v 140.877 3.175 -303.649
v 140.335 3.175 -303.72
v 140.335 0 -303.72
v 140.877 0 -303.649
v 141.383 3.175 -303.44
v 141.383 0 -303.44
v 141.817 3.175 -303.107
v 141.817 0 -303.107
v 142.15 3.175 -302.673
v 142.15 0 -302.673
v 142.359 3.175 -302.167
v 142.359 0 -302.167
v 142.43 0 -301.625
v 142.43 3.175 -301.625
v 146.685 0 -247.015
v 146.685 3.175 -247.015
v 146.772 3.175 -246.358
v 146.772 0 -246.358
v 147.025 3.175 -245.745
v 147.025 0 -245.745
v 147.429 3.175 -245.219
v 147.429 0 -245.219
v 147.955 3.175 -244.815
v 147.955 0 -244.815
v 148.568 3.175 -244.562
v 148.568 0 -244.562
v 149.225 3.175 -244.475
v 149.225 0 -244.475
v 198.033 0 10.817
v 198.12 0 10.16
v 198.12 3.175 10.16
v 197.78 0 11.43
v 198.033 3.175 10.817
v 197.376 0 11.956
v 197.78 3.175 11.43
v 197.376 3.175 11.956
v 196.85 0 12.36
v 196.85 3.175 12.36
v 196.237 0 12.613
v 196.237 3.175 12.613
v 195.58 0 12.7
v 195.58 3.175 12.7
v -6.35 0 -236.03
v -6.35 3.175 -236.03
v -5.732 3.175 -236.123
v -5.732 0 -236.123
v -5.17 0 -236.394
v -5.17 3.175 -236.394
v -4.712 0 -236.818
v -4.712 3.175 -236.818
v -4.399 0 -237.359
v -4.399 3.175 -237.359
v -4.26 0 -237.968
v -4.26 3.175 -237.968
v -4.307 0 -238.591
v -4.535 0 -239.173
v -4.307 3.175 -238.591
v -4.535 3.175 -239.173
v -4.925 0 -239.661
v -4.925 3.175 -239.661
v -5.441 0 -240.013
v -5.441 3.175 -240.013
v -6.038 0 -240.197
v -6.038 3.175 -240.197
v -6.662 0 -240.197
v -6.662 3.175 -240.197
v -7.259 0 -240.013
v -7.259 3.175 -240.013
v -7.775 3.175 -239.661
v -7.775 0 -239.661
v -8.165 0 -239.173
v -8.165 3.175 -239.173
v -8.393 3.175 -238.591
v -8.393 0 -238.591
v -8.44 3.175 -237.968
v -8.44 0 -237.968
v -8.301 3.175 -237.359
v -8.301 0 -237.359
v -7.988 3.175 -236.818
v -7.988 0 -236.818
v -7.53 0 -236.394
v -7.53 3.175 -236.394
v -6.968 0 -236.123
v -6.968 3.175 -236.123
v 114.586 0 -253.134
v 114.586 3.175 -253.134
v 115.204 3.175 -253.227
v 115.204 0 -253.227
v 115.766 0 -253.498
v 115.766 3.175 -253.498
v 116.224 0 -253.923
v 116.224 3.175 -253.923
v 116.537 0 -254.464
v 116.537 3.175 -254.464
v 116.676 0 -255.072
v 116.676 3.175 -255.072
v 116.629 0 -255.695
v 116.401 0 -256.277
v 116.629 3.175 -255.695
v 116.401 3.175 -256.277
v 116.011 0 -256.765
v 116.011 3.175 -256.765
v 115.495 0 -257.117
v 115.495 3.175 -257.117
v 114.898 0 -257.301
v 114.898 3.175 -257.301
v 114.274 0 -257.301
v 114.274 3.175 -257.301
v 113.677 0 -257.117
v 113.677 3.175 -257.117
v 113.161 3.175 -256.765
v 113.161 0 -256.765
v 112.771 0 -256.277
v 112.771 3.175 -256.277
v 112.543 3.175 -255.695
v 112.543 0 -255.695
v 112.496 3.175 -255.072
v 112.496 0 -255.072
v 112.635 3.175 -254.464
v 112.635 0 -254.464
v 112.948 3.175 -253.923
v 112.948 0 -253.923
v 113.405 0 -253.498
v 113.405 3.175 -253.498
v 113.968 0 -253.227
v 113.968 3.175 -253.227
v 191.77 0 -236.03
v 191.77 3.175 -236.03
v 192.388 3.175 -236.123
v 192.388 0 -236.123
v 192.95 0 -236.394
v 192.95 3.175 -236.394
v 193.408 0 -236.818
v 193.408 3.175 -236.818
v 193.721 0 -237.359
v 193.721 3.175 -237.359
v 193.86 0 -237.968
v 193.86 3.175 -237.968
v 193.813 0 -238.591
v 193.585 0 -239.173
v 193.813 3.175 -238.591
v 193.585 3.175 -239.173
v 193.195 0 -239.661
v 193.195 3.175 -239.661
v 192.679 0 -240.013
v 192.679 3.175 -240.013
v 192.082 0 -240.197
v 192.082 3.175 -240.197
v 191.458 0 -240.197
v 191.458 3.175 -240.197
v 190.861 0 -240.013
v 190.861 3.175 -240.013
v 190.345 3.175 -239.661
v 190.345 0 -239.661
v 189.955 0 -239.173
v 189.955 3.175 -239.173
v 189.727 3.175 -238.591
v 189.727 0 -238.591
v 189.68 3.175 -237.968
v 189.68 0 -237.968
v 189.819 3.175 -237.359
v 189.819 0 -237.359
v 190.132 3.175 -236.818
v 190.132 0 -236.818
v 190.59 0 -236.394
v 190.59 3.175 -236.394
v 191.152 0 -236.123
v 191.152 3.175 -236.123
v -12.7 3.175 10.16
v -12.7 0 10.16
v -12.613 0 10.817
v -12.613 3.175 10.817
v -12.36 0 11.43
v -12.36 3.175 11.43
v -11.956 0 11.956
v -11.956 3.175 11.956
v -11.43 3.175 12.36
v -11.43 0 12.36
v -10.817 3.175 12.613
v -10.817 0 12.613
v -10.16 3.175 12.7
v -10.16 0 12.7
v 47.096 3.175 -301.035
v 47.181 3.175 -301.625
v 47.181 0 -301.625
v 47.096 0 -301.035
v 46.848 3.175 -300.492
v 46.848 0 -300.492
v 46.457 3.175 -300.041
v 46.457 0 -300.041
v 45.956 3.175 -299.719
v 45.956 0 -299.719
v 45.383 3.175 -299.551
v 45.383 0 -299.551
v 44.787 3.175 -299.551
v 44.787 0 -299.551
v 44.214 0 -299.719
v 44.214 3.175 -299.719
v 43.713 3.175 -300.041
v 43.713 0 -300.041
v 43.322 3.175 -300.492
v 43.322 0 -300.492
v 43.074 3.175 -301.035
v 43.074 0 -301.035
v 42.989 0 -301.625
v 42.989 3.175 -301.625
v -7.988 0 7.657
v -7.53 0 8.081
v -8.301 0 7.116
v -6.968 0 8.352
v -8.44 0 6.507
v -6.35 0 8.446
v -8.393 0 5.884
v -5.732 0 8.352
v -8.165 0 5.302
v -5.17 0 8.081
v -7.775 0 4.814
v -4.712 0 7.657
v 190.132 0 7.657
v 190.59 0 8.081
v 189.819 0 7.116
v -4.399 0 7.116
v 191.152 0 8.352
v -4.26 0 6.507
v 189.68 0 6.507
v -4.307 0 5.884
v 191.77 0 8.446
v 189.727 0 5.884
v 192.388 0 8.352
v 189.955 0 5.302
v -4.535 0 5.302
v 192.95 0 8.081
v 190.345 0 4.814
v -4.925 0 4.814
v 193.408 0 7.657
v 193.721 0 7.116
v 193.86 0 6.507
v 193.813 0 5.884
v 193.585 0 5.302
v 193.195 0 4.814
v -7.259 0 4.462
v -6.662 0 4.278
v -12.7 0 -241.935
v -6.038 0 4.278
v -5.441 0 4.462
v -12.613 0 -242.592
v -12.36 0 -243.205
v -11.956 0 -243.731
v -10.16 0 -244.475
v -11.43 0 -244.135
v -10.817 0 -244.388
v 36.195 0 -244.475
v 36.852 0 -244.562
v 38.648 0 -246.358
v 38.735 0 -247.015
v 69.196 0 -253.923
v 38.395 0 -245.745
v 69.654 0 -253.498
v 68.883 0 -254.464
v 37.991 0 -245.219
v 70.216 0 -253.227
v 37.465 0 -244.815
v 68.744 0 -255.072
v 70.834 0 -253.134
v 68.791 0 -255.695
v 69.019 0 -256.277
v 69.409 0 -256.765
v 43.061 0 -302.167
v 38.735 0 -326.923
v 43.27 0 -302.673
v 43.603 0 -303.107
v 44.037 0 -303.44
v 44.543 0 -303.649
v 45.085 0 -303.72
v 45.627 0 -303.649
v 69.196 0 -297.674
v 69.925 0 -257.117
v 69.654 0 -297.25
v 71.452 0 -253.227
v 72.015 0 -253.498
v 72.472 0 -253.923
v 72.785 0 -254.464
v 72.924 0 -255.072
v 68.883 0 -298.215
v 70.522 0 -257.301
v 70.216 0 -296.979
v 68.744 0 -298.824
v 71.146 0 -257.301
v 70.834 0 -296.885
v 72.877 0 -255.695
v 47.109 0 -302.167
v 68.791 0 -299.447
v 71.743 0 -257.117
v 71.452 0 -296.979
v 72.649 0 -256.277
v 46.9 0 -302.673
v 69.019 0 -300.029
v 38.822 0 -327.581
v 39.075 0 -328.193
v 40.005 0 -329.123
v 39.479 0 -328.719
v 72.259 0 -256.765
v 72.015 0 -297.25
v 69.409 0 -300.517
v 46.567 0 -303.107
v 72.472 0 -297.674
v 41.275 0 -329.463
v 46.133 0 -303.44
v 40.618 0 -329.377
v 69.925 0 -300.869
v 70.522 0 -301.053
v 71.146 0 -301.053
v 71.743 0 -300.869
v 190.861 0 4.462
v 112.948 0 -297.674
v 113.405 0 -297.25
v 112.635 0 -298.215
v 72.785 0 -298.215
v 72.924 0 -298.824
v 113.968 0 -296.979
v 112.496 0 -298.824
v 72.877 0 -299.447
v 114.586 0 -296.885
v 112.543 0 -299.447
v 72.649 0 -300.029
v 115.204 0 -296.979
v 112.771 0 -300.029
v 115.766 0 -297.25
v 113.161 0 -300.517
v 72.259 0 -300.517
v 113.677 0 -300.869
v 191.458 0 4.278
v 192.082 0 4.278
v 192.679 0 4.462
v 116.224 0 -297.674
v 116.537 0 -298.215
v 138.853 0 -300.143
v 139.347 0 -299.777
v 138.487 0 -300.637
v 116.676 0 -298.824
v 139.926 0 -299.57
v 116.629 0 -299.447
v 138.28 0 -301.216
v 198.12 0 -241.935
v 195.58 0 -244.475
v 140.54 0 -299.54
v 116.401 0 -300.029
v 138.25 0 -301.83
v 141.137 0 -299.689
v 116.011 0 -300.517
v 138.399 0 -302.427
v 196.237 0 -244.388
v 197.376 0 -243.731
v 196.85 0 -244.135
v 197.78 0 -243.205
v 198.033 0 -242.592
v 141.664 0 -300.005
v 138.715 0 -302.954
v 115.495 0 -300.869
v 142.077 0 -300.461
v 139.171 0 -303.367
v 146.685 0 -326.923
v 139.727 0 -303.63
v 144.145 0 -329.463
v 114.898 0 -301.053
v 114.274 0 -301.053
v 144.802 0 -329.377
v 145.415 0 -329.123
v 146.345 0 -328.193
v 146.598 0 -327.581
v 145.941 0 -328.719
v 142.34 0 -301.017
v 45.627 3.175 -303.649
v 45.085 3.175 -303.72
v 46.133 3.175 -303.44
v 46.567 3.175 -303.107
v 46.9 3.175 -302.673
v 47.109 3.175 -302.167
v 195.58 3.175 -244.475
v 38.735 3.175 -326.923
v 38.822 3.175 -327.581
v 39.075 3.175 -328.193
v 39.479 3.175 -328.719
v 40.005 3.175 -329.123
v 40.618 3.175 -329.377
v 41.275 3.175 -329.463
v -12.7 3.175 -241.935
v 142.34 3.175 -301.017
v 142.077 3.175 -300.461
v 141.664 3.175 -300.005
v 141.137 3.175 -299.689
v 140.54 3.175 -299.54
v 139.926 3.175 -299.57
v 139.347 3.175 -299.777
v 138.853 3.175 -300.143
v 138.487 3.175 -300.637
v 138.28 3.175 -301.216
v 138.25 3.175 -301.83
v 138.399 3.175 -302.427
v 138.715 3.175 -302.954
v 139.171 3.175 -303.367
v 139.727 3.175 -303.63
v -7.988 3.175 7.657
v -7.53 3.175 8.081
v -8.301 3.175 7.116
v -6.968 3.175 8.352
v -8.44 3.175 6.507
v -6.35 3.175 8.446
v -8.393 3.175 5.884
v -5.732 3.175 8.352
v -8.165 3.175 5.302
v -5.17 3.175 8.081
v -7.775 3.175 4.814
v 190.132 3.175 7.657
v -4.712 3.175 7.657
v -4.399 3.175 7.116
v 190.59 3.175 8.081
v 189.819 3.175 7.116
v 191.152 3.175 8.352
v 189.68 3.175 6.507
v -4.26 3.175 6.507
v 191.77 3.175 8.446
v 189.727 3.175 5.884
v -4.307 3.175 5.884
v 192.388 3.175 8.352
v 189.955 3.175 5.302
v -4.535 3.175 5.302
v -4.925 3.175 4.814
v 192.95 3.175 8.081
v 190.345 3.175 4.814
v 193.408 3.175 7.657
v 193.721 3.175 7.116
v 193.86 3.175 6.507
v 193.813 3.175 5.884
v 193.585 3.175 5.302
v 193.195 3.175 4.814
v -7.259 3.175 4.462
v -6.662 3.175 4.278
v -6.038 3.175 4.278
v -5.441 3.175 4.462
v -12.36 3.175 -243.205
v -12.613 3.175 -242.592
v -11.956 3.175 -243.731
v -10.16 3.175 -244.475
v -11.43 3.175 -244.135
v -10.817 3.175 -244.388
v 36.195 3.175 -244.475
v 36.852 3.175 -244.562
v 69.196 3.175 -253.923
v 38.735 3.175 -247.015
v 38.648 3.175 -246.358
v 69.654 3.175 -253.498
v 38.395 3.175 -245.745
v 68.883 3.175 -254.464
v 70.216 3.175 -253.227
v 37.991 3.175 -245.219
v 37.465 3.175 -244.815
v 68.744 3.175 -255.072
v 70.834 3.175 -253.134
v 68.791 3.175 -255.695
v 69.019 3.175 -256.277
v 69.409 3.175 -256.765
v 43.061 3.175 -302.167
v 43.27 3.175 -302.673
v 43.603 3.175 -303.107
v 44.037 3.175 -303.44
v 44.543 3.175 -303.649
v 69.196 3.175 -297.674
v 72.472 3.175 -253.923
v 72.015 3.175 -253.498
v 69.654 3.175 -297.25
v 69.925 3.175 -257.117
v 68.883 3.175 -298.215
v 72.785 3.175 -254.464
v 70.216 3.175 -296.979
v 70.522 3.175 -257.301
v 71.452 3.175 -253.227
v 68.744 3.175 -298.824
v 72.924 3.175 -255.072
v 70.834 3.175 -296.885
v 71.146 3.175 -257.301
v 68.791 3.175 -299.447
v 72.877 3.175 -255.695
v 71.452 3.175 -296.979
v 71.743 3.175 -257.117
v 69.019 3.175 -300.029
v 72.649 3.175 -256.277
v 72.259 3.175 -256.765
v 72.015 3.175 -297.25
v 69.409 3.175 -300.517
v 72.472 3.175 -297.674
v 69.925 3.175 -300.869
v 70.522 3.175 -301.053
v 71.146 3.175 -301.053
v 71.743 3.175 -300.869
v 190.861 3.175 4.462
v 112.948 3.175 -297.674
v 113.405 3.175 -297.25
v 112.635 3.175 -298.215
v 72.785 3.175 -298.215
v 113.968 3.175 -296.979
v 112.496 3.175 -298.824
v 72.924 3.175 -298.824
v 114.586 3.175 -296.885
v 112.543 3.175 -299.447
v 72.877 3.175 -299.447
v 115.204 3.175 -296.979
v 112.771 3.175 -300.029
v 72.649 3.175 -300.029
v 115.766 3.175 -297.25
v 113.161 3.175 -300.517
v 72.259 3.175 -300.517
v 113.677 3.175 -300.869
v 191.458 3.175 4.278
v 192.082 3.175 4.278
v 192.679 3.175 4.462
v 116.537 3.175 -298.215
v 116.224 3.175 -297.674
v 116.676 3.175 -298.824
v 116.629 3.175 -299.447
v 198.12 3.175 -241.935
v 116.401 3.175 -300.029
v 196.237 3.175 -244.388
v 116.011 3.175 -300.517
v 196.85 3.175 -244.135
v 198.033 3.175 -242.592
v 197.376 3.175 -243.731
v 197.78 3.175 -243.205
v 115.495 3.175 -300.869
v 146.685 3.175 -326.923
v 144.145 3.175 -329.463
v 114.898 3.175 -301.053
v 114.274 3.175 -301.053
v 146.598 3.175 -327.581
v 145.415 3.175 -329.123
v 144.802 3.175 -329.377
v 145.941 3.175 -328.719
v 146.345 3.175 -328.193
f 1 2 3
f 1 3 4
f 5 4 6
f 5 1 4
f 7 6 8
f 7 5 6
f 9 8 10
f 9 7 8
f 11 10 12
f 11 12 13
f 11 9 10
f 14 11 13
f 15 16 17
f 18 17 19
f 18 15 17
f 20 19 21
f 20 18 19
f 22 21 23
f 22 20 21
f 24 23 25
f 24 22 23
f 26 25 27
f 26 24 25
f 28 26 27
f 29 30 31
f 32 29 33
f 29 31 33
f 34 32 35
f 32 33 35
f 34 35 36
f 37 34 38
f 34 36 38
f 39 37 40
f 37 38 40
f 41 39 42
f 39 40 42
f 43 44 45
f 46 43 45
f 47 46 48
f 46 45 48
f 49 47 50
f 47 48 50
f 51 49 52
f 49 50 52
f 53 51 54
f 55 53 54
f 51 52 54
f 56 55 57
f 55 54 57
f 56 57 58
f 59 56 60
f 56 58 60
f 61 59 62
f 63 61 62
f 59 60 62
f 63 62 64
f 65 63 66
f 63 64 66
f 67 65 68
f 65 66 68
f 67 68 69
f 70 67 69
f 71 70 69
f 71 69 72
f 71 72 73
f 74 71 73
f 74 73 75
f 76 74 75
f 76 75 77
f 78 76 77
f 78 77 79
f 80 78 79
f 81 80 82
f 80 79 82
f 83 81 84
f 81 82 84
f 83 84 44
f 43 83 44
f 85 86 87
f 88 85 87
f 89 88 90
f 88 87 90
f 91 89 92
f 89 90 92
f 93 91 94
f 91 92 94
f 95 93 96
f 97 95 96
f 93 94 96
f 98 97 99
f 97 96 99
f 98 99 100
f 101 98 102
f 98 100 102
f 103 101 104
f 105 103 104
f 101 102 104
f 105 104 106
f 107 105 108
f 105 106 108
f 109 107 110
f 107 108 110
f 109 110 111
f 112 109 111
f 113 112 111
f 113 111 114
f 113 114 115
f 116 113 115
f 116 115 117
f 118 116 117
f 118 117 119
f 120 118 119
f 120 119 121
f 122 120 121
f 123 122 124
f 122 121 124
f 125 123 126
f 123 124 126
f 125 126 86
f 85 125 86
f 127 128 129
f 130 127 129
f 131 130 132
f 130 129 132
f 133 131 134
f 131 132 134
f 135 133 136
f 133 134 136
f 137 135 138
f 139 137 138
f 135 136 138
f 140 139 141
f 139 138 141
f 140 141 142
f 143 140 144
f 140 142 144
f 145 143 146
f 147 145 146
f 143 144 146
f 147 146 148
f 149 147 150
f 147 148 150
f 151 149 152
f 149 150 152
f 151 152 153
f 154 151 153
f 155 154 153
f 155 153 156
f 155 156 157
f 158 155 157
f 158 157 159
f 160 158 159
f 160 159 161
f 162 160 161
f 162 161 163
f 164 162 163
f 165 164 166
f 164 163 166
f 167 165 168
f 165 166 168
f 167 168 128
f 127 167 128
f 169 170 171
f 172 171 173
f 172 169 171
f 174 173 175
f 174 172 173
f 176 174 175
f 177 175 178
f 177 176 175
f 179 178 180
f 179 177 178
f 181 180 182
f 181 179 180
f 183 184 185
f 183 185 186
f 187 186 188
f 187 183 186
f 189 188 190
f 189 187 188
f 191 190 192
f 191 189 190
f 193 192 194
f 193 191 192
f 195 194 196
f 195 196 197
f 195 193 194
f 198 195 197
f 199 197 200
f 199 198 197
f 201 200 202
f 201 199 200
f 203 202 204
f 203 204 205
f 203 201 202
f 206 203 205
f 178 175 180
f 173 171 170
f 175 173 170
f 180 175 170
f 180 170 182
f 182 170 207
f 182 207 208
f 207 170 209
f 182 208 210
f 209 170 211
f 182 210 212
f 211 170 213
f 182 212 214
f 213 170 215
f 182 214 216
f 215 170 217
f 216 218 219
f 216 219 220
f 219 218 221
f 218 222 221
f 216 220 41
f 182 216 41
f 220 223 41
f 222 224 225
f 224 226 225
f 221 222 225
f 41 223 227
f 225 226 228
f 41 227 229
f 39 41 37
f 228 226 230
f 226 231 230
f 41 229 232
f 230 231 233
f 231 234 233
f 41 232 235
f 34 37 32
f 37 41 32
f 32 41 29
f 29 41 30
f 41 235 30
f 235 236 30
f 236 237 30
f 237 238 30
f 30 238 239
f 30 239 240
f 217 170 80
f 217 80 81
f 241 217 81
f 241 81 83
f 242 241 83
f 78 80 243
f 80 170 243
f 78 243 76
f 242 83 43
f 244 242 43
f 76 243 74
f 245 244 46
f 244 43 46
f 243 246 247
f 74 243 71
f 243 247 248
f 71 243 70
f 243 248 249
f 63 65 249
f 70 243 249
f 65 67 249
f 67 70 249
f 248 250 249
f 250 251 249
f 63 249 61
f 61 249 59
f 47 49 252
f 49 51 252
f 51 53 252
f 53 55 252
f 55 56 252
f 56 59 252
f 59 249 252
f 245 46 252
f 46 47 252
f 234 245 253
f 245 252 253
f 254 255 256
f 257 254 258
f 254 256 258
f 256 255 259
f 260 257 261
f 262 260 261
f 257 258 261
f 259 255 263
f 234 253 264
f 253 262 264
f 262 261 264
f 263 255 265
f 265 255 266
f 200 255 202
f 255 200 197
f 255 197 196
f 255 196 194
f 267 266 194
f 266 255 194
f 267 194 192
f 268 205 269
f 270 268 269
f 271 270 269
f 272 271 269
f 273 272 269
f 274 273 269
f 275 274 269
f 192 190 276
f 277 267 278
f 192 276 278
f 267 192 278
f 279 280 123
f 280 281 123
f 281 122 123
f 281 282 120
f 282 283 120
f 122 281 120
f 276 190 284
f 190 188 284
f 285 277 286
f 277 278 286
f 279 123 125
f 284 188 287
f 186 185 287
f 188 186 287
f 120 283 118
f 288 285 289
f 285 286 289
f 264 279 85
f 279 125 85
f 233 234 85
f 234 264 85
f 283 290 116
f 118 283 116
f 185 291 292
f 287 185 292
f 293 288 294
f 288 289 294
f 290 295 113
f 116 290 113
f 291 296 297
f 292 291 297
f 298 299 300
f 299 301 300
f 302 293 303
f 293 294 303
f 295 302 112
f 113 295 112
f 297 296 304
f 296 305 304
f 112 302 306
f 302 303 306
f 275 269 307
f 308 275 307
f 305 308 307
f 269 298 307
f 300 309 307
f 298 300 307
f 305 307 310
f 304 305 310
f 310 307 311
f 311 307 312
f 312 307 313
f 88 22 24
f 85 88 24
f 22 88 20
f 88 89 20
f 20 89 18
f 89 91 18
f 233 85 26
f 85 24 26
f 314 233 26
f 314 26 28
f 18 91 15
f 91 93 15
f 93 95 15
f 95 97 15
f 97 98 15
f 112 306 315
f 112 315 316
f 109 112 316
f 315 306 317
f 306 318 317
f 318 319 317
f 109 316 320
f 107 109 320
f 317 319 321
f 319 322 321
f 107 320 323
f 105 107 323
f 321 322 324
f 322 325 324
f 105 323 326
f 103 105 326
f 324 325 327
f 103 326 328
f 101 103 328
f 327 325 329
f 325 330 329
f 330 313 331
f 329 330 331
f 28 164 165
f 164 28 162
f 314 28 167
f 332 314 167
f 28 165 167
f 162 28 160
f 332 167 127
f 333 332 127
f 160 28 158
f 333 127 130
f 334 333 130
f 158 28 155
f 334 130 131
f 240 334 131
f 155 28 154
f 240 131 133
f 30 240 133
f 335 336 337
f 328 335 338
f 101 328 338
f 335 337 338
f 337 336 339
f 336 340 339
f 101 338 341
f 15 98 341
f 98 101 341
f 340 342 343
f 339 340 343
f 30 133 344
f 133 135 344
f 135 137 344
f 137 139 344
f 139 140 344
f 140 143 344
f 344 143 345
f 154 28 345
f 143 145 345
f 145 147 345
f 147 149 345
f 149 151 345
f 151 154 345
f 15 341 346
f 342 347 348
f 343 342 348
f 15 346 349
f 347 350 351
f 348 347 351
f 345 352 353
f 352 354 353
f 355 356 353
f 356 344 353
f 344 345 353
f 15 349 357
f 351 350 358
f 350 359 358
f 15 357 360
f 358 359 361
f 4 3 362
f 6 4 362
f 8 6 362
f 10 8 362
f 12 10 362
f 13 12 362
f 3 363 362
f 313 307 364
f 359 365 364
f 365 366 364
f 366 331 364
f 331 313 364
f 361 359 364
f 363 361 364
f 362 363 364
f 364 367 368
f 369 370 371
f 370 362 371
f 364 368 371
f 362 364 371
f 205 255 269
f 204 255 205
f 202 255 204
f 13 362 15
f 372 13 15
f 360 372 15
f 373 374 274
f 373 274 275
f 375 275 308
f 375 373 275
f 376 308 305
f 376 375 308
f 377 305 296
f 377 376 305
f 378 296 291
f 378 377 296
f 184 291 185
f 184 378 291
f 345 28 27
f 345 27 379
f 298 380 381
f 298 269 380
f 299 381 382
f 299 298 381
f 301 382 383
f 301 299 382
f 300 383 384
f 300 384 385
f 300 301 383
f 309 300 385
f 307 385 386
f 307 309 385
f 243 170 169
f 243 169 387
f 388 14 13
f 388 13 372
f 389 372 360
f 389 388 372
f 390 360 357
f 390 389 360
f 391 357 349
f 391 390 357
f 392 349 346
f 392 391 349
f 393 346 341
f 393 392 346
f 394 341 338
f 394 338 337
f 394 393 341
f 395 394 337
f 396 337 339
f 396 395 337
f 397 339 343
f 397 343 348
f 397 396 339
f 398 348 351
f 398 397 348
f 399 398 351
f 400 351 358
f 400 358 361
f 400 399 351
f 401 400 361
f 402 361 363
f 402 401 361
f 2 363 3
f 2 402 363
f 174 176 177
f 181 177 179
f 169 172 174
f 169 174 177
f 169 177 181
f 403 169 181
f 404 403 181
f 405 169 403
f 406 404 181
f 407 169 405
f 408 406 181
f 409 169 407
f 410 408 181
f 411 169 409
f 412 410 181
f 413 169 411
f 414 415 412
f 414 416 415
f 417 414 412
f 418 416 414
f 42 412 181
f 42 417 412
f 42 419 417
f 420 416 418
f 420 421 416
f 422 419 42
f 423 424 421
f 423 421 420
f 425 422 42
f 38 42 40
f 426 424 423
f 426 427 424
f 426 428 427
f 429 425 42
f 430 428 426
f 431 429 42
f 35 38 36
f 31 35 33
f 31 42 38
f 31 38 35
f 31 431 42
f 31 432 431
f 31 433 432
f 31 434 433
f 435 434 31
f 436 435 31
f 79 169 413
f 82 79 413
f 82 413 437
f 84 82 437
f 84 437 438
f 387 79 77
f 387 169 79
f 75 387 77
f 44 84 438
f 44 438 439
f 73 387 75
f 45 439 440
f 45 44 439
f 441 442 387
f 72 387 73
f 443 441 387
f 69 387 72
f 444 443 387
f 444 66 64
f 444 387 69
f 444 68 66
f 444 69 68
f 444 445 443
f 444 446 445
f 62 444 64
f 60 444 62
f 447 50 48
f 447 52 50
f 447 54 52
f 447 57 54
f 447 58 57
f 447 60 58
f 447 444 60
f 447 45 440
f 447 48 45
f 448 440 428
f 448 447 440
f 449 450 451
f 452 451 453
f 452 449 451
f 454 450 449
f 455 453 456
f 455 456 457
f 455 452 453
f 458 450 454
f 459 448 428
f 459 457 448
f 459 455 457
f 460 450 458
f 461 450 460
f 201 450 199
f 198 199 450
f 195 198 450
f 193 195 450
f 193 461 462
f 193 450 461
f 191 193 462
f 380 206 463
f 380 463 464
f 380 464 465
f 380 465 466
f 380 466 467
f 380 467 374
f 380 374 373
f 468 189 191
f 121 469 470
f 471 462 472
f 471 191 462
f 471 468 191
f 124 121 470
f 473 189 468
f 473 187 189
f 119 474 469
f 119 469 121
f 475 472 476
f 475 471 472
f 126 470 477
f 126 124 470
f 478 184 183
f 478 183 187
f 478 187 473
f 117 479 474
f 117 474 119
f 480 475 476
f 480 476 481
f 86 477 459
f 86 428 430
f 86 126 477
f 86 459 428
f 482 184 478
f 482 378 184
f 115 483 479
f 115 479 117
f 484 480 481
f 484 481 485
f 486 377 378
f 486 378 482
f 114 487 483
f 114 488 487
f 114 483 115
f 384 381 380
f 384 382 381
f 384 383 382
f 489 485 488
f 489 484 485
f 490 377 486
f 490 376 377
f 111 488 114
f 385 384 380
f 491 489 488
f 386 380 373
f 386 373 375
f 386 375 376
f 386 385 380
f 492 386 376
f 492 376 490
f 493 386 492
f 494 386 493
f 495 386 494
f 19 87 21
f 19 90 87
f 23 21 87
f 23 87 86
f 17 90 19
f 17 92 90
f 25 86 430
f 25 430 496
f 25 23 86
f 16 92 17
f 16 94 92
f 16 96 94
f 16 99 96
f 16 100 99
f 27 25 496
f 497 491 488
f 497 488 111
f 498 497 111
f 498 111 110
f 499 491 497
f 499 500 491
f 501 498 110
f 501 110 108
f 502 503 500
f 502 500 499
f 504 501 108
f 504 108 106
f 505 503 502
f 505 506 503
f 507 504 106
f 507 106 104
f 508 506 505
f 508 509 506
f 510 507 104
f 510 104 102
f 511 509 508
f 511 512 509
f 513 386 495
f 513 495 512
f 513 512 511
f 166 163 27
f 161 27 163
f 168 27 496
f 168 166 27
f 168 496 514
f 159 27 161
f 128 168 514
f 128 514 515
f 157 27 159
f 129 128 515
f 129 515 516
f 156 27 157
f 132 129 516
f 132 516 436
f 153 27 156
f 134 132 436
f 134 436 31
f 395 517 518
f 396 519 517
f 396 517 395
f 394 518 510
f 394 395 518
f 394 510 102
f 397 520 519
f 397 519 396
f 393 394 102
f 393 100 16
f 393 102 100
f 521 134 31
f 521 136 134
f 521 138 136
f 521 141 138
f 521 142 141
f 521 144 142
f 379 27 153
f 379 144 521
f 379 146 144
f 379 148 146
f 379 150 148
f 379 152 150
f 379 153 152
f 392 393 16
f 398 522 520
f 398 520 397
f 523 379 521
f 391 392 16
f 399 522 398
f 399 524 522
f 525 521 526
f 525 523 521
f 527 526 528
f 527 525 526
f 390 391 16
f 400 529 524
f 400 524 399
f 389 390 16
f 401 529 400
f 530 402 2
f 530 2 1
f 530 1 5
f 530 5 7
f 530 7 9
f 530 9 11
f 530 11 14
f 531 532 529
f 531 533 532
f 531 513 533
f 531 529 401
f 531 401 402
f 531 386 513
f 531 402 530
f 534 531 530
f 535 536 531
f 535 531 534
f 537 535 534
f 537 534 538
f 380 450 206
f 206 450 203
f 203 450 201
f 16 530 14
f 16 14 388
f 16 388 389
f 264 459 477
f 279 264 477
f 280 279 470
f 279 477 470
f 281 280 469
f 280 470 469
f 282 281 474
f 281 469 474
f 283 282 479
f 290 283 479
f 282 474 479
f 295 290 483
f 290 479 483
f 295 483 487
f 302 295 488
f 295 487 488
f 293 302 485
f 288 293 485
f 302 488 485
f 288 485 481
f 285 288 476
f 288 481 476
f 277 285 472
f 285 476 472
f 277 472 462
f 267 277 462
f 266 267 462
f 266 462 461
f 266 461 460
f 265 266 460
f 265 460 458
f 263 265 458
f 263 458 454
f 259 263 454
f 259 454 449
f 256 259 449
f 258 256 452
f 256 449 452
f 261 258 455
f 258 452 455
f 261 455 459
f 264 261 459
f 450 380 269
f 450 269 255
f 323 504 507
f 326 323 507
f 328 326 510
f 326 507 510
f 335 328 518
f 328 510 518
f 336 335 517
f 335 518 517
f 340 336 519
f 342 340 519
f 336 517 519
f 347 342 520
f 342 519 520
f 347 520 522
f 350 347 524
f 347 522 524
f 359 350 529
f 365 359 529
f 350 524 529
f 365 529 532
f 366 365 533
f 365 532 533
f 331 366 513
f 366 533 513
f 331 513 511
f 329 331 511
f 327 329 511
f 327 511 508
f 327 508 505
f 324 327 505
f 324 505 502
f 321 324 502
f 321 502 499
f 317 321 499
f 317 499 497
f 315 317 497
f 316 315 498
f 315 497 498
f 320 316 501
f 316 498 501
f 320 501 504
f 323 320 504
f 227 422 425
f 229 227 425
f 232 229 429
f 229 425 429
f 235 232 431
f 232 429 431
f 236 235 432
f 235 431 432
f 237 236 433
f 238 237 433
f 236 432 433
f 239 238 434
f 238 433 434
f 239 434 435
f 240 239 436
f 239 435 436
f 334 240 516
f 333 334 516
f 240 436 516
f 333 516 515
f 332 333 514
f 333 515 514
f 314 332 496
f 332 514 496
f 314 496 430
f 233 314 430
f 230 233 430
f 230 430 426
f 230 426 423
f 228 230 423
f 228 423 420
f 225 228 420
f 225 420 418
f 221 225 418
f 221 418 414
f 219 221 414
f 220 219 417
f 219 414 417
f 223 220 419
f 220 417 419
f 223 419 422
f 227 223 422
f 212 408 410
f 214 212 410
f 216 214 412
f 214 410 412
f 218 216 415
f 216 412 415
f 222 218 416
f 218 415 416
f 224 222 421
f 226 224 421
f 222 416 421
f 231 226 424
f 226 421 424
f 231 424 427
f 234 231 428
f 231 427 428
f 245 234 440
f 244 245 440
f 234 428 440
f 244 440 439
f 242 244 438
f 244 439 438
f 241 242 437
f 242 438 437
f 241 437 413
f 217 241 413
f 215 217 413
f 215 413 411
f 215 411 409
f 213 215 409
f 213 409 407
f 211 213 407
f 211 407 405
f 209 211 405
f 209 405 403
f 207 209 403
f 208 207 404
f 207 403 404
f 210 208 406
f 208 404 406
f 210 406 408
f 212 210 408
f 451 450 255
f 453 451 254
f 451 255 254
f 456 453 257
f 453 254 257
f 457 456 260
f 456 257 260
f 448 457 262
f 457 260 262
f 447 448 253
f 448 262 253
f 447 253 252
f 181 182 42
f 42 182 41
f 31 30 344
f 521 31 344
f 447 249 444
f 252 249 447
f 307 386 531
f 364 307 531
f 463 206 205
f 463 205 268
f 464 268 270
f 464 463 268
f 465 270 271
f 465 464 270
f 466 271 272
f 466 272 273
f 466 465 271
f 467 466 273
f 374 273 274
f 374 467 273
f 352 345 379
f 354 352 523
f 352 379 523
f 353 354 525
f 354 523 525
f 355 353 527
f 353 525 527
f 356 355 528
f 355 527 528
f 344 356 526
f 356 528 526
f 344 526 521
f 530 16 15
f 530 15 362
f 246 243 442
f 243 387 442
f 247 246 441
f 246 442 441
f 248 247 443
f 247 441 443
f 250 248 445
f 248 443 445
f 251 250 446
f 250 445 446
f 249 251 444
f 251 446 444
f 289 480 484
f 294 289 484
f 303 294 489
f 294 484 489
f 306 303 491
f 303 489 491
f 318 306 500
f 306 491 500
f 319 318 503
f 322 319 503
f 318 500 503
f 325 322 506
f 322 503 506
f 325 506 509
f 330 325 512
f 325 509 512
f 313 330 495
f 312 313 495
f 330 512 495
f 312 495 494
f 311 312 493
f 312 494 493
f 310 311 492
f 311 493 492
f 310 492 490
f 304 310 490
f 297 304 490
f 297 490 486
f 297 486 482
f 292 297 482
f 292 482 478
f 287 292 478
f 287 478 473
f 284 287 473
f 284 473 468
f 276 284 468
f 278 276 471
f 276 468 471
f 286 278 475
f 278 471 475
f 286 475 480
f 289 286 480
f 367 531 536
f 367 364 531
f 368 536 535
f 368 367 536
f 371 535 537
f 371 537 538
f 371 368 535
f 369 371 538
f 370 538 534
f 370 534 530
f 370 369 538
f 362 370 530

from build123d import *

# Parameters (mm, degrees)
SKETCH1_W           = 210.82
SKETCH1_H           = 257.175
SKETCH1_W_2         = 185.42
SKETCH1_H_2         = 231.775
BOSS_EXTRUDE1_DEPTH = 3.175
SKETCH3_R           = 2.0955
CUT_EXTRUDE1_DEPTH  = 3.175
SKETCH3_3_R         = 45.33
SKETCH3_3_W         = 107.95
SKETCH3_3_H         = 21.4884
BOSS_EXTRUDE2_DEPTH = 3.175
FILLET1_R           = 2.54
SKETCH4_R           = 2.0955
CUT_EXTRUDE2_DEPTH  = 3.175


with BuildPart() as part:
    # Sketch1 → Boss-Extrude1 (new body)
    with BuildSketch(Plane(origin=(0, 0, 0), x_dir=(1, 0, 0), z_dir=(0, 1, 0))):
        with Locations((92.71, 115.8875)):
            Rectangle(SKETCH1_W, SKETCH1_H)
        with Locations((92.71, 115.8875)):
            Rectangle(SKETCH1_W_2, SKETCH1_H_2, mode=Mode.SUBTRACT)
        with Locations((92.71, 115.8875)):
            Rectangle(SKETCH1_W_2, SKETCH1_H_2)
    extrude(amount=BOSS_EXTRUDE1_DEPTH)

    # Sketch3 → Cut-Extrude1 (cut)
    with BuildSketch(Plane(origin=(0, 3.175, 0), x_dir=(1, 0, 0), z_dir=(0, 1, 0))):
        with Locations(Location((191.77, 238.125, 0), (0, 0, 270))):
            Circle(SKETCH3_R)
        with Locations(Location((191.77, -6.35, 0), (0, 0, 270))):
            Circle(SKETCH3_R)
        with Locations(Location((-6.35, -6.35, 0), (0, 0, 270))):
            Circle(SKETCH3_R)
        with Locations(Location((-6.35, 238.125, 0), (0, 0, 270))):
            Circle(SKETCH3_R)
    extrude(amount=-CUT_EXTRUDE1_DEPTH, mode=Mode.SUBTRACT)

    # Sketch3<3> → Boss-Extrude2 (add)
    with BuildSketch(Plane(origin=(0, 3.175, 0), x_dir=(1, 0, 0), z_dir=(0, 1, 0))):
        with BuildLine():
            ThreePointArc((138.04, 277.105), (134.430200877, 259.378360759), (124.175727387, 244.475))
            Line((124.175727387, 244.475), (146.685, 244.475))
            Line((146.685, 244.475), (146.685, 301.625))
            Line((146.685, 301.625), (142.4305, 301.625))
            ThreePointArc((142.4305, 301.625), (138.85325774, 300.14325774), (140.335, 303.7205))
            Line((140.335, 303.7205), (140.335, 307.975))
            Line((140.335, 307.975), (125.904156112, 307.975))
            ThreePointArc((125.904156112, 307.975), (134.897083311, 293.68989981), (138.04, 277.105))
        make_face()
        with BuildLine():
            Line((142.4305, 301.625), (146.685, 301.625))
            Line((146.685, 301.625), (146.685, 307.975))
            Line((146.685, 307.975), (140.335, 307.975))
            Line((140.335, 307.975), (140.335, 303.7205))
            ThreePointArc((140.335, 303.7205), (141.81674226, 303.10674226), (142.4305, 301.625))
        make_face()
        with BuildLine():
            Line((38.735, 244.475), (61.244272613, 244.475))
            ThreePointArc((61.244272613, 244.475), (47.396783015, 275.871603687), (59.515843888, 307.975))
            Line((59.515843888, 307.975), (45.085, 307.975))
            Line((45.085, 307.975), (45.085, 303.7205))
            ThreePointArc((45.085, 303.7205), (46.56674226, 303.10674226), (47.1805, 301.625))
            ThreePointArc((47.1805, 301.625), (45.085, 299.5295), (42.9895, 301.625))
            Line((42.9895, 301.625), (38.735, 301.625))
            Line((38.735, 301.625), (38.735, 244.475))
        make_face()
        with BuildLine():
            Line((38.735, 307.975), (38.735, 301.625))
            Line((38.735, 301.625), (42.9895, 301.625))
            ThreePointArc((42.9895, 301.625), (43.60325774, 303.10674226), (45.085, 303.7205))
            Line((45.085, 303.7205), (45.085, 307.975))
            Line((45.085, 307.975), (38.735, 307.975))
        make_face()
        with BuildLine():
            ThreePointArc((61.244272613, 244.475), (75.743989862, 235.069736233), (92.71, 231.775))
            Line((92.71, 231.775), (92.71, 244.475))
            Line((92.71, 244.475), (61.244272613, 244.475))
        make_face()
        with BuildLine():
            Line((92.71, 244.475), (92.71, 231.775))
            ThreePointArc((92.71, 231.775), (109.676010138, 235.069736233), (124.175727387, 244.475))
            Line((124.175727387, 244.475), (92.71, 244.475))
        make_face()
        with Locations((92.71, 277.105)):
            Circle(SKETCH3_3_R)
        with Locations((92.71, 318.7192)):
            Rectangle(SKETCH3_3_W, SKETCH3_3_H)
        with BuildLine():
            Line((59.515843888, 307.975), (92.71, 307.975))
            Line((92.71, 307.975), (92.71, 322.435))
            ThreePointArc((92.71, 322.435), (74.606522434, 318.663067809), (59.515843888, 307.975))
        make_face()
        with BuildLine():
            Line((92.71, 322.435), (92.71, 307.975))
            Line((92.71, 307.975), (125.904156112, 307.975))
            ThreePointArc((125.904156112, 307.975), (110.813477566, 318.663067809), (92.71, 322.435))
        make_face()
    extrude(amount=-BOSS_EXTRUDE2_DEPTH)

    # Fillet1
    fillet1_edges = [part.edges().sort_by_distance(p)[0] for p in [
        (146.685, 1.5875, -244.475),
        (38.735, 1.5875, -244.475),
        (38.735, 1.5875, -329.4634),
        (146.685, 1.5875, -329.4634),
        (-12.7, 1.5875, -244.475),
        (198.12, 1.5875, -244.475),
        (198.12, 1.5875, 12.7),
        (-12.7, 1.5875, 12.7),
    ]]
    fillet(fillet1_edges, radius=FILLET1_R)

    # Sketch4 → Cut-Extrude2 (cut)
    with BuildSketch(Plane(origin=(0, 3.175, 0), x_dir=(1, 0, 0), z_dir=(0, 1, 0))):
        with Locations(Location((70.834096089, 298.980903911, 0), (0, 0, 270))):
            Circle(SKETCH4_R)
        with Locations(Location((114.585903911, 298.980903911, 0), (0, 0, 270))):
            Circle(SKETCH4_R)
        with Locations(Location((114.585903911, 255.229096089, 0), (0, 0, 270))):
            Circle(SKETCH4_R)
        with Locations(Location((70.834096089, 255.229096089, 0), (0, 0, 270))):
            Circle(SKETCH4_R)
    extrude(amount=-CUT_EXTRUDE2_DEPTH, mode=Mode.SUBTRACT)


solid = part.part
